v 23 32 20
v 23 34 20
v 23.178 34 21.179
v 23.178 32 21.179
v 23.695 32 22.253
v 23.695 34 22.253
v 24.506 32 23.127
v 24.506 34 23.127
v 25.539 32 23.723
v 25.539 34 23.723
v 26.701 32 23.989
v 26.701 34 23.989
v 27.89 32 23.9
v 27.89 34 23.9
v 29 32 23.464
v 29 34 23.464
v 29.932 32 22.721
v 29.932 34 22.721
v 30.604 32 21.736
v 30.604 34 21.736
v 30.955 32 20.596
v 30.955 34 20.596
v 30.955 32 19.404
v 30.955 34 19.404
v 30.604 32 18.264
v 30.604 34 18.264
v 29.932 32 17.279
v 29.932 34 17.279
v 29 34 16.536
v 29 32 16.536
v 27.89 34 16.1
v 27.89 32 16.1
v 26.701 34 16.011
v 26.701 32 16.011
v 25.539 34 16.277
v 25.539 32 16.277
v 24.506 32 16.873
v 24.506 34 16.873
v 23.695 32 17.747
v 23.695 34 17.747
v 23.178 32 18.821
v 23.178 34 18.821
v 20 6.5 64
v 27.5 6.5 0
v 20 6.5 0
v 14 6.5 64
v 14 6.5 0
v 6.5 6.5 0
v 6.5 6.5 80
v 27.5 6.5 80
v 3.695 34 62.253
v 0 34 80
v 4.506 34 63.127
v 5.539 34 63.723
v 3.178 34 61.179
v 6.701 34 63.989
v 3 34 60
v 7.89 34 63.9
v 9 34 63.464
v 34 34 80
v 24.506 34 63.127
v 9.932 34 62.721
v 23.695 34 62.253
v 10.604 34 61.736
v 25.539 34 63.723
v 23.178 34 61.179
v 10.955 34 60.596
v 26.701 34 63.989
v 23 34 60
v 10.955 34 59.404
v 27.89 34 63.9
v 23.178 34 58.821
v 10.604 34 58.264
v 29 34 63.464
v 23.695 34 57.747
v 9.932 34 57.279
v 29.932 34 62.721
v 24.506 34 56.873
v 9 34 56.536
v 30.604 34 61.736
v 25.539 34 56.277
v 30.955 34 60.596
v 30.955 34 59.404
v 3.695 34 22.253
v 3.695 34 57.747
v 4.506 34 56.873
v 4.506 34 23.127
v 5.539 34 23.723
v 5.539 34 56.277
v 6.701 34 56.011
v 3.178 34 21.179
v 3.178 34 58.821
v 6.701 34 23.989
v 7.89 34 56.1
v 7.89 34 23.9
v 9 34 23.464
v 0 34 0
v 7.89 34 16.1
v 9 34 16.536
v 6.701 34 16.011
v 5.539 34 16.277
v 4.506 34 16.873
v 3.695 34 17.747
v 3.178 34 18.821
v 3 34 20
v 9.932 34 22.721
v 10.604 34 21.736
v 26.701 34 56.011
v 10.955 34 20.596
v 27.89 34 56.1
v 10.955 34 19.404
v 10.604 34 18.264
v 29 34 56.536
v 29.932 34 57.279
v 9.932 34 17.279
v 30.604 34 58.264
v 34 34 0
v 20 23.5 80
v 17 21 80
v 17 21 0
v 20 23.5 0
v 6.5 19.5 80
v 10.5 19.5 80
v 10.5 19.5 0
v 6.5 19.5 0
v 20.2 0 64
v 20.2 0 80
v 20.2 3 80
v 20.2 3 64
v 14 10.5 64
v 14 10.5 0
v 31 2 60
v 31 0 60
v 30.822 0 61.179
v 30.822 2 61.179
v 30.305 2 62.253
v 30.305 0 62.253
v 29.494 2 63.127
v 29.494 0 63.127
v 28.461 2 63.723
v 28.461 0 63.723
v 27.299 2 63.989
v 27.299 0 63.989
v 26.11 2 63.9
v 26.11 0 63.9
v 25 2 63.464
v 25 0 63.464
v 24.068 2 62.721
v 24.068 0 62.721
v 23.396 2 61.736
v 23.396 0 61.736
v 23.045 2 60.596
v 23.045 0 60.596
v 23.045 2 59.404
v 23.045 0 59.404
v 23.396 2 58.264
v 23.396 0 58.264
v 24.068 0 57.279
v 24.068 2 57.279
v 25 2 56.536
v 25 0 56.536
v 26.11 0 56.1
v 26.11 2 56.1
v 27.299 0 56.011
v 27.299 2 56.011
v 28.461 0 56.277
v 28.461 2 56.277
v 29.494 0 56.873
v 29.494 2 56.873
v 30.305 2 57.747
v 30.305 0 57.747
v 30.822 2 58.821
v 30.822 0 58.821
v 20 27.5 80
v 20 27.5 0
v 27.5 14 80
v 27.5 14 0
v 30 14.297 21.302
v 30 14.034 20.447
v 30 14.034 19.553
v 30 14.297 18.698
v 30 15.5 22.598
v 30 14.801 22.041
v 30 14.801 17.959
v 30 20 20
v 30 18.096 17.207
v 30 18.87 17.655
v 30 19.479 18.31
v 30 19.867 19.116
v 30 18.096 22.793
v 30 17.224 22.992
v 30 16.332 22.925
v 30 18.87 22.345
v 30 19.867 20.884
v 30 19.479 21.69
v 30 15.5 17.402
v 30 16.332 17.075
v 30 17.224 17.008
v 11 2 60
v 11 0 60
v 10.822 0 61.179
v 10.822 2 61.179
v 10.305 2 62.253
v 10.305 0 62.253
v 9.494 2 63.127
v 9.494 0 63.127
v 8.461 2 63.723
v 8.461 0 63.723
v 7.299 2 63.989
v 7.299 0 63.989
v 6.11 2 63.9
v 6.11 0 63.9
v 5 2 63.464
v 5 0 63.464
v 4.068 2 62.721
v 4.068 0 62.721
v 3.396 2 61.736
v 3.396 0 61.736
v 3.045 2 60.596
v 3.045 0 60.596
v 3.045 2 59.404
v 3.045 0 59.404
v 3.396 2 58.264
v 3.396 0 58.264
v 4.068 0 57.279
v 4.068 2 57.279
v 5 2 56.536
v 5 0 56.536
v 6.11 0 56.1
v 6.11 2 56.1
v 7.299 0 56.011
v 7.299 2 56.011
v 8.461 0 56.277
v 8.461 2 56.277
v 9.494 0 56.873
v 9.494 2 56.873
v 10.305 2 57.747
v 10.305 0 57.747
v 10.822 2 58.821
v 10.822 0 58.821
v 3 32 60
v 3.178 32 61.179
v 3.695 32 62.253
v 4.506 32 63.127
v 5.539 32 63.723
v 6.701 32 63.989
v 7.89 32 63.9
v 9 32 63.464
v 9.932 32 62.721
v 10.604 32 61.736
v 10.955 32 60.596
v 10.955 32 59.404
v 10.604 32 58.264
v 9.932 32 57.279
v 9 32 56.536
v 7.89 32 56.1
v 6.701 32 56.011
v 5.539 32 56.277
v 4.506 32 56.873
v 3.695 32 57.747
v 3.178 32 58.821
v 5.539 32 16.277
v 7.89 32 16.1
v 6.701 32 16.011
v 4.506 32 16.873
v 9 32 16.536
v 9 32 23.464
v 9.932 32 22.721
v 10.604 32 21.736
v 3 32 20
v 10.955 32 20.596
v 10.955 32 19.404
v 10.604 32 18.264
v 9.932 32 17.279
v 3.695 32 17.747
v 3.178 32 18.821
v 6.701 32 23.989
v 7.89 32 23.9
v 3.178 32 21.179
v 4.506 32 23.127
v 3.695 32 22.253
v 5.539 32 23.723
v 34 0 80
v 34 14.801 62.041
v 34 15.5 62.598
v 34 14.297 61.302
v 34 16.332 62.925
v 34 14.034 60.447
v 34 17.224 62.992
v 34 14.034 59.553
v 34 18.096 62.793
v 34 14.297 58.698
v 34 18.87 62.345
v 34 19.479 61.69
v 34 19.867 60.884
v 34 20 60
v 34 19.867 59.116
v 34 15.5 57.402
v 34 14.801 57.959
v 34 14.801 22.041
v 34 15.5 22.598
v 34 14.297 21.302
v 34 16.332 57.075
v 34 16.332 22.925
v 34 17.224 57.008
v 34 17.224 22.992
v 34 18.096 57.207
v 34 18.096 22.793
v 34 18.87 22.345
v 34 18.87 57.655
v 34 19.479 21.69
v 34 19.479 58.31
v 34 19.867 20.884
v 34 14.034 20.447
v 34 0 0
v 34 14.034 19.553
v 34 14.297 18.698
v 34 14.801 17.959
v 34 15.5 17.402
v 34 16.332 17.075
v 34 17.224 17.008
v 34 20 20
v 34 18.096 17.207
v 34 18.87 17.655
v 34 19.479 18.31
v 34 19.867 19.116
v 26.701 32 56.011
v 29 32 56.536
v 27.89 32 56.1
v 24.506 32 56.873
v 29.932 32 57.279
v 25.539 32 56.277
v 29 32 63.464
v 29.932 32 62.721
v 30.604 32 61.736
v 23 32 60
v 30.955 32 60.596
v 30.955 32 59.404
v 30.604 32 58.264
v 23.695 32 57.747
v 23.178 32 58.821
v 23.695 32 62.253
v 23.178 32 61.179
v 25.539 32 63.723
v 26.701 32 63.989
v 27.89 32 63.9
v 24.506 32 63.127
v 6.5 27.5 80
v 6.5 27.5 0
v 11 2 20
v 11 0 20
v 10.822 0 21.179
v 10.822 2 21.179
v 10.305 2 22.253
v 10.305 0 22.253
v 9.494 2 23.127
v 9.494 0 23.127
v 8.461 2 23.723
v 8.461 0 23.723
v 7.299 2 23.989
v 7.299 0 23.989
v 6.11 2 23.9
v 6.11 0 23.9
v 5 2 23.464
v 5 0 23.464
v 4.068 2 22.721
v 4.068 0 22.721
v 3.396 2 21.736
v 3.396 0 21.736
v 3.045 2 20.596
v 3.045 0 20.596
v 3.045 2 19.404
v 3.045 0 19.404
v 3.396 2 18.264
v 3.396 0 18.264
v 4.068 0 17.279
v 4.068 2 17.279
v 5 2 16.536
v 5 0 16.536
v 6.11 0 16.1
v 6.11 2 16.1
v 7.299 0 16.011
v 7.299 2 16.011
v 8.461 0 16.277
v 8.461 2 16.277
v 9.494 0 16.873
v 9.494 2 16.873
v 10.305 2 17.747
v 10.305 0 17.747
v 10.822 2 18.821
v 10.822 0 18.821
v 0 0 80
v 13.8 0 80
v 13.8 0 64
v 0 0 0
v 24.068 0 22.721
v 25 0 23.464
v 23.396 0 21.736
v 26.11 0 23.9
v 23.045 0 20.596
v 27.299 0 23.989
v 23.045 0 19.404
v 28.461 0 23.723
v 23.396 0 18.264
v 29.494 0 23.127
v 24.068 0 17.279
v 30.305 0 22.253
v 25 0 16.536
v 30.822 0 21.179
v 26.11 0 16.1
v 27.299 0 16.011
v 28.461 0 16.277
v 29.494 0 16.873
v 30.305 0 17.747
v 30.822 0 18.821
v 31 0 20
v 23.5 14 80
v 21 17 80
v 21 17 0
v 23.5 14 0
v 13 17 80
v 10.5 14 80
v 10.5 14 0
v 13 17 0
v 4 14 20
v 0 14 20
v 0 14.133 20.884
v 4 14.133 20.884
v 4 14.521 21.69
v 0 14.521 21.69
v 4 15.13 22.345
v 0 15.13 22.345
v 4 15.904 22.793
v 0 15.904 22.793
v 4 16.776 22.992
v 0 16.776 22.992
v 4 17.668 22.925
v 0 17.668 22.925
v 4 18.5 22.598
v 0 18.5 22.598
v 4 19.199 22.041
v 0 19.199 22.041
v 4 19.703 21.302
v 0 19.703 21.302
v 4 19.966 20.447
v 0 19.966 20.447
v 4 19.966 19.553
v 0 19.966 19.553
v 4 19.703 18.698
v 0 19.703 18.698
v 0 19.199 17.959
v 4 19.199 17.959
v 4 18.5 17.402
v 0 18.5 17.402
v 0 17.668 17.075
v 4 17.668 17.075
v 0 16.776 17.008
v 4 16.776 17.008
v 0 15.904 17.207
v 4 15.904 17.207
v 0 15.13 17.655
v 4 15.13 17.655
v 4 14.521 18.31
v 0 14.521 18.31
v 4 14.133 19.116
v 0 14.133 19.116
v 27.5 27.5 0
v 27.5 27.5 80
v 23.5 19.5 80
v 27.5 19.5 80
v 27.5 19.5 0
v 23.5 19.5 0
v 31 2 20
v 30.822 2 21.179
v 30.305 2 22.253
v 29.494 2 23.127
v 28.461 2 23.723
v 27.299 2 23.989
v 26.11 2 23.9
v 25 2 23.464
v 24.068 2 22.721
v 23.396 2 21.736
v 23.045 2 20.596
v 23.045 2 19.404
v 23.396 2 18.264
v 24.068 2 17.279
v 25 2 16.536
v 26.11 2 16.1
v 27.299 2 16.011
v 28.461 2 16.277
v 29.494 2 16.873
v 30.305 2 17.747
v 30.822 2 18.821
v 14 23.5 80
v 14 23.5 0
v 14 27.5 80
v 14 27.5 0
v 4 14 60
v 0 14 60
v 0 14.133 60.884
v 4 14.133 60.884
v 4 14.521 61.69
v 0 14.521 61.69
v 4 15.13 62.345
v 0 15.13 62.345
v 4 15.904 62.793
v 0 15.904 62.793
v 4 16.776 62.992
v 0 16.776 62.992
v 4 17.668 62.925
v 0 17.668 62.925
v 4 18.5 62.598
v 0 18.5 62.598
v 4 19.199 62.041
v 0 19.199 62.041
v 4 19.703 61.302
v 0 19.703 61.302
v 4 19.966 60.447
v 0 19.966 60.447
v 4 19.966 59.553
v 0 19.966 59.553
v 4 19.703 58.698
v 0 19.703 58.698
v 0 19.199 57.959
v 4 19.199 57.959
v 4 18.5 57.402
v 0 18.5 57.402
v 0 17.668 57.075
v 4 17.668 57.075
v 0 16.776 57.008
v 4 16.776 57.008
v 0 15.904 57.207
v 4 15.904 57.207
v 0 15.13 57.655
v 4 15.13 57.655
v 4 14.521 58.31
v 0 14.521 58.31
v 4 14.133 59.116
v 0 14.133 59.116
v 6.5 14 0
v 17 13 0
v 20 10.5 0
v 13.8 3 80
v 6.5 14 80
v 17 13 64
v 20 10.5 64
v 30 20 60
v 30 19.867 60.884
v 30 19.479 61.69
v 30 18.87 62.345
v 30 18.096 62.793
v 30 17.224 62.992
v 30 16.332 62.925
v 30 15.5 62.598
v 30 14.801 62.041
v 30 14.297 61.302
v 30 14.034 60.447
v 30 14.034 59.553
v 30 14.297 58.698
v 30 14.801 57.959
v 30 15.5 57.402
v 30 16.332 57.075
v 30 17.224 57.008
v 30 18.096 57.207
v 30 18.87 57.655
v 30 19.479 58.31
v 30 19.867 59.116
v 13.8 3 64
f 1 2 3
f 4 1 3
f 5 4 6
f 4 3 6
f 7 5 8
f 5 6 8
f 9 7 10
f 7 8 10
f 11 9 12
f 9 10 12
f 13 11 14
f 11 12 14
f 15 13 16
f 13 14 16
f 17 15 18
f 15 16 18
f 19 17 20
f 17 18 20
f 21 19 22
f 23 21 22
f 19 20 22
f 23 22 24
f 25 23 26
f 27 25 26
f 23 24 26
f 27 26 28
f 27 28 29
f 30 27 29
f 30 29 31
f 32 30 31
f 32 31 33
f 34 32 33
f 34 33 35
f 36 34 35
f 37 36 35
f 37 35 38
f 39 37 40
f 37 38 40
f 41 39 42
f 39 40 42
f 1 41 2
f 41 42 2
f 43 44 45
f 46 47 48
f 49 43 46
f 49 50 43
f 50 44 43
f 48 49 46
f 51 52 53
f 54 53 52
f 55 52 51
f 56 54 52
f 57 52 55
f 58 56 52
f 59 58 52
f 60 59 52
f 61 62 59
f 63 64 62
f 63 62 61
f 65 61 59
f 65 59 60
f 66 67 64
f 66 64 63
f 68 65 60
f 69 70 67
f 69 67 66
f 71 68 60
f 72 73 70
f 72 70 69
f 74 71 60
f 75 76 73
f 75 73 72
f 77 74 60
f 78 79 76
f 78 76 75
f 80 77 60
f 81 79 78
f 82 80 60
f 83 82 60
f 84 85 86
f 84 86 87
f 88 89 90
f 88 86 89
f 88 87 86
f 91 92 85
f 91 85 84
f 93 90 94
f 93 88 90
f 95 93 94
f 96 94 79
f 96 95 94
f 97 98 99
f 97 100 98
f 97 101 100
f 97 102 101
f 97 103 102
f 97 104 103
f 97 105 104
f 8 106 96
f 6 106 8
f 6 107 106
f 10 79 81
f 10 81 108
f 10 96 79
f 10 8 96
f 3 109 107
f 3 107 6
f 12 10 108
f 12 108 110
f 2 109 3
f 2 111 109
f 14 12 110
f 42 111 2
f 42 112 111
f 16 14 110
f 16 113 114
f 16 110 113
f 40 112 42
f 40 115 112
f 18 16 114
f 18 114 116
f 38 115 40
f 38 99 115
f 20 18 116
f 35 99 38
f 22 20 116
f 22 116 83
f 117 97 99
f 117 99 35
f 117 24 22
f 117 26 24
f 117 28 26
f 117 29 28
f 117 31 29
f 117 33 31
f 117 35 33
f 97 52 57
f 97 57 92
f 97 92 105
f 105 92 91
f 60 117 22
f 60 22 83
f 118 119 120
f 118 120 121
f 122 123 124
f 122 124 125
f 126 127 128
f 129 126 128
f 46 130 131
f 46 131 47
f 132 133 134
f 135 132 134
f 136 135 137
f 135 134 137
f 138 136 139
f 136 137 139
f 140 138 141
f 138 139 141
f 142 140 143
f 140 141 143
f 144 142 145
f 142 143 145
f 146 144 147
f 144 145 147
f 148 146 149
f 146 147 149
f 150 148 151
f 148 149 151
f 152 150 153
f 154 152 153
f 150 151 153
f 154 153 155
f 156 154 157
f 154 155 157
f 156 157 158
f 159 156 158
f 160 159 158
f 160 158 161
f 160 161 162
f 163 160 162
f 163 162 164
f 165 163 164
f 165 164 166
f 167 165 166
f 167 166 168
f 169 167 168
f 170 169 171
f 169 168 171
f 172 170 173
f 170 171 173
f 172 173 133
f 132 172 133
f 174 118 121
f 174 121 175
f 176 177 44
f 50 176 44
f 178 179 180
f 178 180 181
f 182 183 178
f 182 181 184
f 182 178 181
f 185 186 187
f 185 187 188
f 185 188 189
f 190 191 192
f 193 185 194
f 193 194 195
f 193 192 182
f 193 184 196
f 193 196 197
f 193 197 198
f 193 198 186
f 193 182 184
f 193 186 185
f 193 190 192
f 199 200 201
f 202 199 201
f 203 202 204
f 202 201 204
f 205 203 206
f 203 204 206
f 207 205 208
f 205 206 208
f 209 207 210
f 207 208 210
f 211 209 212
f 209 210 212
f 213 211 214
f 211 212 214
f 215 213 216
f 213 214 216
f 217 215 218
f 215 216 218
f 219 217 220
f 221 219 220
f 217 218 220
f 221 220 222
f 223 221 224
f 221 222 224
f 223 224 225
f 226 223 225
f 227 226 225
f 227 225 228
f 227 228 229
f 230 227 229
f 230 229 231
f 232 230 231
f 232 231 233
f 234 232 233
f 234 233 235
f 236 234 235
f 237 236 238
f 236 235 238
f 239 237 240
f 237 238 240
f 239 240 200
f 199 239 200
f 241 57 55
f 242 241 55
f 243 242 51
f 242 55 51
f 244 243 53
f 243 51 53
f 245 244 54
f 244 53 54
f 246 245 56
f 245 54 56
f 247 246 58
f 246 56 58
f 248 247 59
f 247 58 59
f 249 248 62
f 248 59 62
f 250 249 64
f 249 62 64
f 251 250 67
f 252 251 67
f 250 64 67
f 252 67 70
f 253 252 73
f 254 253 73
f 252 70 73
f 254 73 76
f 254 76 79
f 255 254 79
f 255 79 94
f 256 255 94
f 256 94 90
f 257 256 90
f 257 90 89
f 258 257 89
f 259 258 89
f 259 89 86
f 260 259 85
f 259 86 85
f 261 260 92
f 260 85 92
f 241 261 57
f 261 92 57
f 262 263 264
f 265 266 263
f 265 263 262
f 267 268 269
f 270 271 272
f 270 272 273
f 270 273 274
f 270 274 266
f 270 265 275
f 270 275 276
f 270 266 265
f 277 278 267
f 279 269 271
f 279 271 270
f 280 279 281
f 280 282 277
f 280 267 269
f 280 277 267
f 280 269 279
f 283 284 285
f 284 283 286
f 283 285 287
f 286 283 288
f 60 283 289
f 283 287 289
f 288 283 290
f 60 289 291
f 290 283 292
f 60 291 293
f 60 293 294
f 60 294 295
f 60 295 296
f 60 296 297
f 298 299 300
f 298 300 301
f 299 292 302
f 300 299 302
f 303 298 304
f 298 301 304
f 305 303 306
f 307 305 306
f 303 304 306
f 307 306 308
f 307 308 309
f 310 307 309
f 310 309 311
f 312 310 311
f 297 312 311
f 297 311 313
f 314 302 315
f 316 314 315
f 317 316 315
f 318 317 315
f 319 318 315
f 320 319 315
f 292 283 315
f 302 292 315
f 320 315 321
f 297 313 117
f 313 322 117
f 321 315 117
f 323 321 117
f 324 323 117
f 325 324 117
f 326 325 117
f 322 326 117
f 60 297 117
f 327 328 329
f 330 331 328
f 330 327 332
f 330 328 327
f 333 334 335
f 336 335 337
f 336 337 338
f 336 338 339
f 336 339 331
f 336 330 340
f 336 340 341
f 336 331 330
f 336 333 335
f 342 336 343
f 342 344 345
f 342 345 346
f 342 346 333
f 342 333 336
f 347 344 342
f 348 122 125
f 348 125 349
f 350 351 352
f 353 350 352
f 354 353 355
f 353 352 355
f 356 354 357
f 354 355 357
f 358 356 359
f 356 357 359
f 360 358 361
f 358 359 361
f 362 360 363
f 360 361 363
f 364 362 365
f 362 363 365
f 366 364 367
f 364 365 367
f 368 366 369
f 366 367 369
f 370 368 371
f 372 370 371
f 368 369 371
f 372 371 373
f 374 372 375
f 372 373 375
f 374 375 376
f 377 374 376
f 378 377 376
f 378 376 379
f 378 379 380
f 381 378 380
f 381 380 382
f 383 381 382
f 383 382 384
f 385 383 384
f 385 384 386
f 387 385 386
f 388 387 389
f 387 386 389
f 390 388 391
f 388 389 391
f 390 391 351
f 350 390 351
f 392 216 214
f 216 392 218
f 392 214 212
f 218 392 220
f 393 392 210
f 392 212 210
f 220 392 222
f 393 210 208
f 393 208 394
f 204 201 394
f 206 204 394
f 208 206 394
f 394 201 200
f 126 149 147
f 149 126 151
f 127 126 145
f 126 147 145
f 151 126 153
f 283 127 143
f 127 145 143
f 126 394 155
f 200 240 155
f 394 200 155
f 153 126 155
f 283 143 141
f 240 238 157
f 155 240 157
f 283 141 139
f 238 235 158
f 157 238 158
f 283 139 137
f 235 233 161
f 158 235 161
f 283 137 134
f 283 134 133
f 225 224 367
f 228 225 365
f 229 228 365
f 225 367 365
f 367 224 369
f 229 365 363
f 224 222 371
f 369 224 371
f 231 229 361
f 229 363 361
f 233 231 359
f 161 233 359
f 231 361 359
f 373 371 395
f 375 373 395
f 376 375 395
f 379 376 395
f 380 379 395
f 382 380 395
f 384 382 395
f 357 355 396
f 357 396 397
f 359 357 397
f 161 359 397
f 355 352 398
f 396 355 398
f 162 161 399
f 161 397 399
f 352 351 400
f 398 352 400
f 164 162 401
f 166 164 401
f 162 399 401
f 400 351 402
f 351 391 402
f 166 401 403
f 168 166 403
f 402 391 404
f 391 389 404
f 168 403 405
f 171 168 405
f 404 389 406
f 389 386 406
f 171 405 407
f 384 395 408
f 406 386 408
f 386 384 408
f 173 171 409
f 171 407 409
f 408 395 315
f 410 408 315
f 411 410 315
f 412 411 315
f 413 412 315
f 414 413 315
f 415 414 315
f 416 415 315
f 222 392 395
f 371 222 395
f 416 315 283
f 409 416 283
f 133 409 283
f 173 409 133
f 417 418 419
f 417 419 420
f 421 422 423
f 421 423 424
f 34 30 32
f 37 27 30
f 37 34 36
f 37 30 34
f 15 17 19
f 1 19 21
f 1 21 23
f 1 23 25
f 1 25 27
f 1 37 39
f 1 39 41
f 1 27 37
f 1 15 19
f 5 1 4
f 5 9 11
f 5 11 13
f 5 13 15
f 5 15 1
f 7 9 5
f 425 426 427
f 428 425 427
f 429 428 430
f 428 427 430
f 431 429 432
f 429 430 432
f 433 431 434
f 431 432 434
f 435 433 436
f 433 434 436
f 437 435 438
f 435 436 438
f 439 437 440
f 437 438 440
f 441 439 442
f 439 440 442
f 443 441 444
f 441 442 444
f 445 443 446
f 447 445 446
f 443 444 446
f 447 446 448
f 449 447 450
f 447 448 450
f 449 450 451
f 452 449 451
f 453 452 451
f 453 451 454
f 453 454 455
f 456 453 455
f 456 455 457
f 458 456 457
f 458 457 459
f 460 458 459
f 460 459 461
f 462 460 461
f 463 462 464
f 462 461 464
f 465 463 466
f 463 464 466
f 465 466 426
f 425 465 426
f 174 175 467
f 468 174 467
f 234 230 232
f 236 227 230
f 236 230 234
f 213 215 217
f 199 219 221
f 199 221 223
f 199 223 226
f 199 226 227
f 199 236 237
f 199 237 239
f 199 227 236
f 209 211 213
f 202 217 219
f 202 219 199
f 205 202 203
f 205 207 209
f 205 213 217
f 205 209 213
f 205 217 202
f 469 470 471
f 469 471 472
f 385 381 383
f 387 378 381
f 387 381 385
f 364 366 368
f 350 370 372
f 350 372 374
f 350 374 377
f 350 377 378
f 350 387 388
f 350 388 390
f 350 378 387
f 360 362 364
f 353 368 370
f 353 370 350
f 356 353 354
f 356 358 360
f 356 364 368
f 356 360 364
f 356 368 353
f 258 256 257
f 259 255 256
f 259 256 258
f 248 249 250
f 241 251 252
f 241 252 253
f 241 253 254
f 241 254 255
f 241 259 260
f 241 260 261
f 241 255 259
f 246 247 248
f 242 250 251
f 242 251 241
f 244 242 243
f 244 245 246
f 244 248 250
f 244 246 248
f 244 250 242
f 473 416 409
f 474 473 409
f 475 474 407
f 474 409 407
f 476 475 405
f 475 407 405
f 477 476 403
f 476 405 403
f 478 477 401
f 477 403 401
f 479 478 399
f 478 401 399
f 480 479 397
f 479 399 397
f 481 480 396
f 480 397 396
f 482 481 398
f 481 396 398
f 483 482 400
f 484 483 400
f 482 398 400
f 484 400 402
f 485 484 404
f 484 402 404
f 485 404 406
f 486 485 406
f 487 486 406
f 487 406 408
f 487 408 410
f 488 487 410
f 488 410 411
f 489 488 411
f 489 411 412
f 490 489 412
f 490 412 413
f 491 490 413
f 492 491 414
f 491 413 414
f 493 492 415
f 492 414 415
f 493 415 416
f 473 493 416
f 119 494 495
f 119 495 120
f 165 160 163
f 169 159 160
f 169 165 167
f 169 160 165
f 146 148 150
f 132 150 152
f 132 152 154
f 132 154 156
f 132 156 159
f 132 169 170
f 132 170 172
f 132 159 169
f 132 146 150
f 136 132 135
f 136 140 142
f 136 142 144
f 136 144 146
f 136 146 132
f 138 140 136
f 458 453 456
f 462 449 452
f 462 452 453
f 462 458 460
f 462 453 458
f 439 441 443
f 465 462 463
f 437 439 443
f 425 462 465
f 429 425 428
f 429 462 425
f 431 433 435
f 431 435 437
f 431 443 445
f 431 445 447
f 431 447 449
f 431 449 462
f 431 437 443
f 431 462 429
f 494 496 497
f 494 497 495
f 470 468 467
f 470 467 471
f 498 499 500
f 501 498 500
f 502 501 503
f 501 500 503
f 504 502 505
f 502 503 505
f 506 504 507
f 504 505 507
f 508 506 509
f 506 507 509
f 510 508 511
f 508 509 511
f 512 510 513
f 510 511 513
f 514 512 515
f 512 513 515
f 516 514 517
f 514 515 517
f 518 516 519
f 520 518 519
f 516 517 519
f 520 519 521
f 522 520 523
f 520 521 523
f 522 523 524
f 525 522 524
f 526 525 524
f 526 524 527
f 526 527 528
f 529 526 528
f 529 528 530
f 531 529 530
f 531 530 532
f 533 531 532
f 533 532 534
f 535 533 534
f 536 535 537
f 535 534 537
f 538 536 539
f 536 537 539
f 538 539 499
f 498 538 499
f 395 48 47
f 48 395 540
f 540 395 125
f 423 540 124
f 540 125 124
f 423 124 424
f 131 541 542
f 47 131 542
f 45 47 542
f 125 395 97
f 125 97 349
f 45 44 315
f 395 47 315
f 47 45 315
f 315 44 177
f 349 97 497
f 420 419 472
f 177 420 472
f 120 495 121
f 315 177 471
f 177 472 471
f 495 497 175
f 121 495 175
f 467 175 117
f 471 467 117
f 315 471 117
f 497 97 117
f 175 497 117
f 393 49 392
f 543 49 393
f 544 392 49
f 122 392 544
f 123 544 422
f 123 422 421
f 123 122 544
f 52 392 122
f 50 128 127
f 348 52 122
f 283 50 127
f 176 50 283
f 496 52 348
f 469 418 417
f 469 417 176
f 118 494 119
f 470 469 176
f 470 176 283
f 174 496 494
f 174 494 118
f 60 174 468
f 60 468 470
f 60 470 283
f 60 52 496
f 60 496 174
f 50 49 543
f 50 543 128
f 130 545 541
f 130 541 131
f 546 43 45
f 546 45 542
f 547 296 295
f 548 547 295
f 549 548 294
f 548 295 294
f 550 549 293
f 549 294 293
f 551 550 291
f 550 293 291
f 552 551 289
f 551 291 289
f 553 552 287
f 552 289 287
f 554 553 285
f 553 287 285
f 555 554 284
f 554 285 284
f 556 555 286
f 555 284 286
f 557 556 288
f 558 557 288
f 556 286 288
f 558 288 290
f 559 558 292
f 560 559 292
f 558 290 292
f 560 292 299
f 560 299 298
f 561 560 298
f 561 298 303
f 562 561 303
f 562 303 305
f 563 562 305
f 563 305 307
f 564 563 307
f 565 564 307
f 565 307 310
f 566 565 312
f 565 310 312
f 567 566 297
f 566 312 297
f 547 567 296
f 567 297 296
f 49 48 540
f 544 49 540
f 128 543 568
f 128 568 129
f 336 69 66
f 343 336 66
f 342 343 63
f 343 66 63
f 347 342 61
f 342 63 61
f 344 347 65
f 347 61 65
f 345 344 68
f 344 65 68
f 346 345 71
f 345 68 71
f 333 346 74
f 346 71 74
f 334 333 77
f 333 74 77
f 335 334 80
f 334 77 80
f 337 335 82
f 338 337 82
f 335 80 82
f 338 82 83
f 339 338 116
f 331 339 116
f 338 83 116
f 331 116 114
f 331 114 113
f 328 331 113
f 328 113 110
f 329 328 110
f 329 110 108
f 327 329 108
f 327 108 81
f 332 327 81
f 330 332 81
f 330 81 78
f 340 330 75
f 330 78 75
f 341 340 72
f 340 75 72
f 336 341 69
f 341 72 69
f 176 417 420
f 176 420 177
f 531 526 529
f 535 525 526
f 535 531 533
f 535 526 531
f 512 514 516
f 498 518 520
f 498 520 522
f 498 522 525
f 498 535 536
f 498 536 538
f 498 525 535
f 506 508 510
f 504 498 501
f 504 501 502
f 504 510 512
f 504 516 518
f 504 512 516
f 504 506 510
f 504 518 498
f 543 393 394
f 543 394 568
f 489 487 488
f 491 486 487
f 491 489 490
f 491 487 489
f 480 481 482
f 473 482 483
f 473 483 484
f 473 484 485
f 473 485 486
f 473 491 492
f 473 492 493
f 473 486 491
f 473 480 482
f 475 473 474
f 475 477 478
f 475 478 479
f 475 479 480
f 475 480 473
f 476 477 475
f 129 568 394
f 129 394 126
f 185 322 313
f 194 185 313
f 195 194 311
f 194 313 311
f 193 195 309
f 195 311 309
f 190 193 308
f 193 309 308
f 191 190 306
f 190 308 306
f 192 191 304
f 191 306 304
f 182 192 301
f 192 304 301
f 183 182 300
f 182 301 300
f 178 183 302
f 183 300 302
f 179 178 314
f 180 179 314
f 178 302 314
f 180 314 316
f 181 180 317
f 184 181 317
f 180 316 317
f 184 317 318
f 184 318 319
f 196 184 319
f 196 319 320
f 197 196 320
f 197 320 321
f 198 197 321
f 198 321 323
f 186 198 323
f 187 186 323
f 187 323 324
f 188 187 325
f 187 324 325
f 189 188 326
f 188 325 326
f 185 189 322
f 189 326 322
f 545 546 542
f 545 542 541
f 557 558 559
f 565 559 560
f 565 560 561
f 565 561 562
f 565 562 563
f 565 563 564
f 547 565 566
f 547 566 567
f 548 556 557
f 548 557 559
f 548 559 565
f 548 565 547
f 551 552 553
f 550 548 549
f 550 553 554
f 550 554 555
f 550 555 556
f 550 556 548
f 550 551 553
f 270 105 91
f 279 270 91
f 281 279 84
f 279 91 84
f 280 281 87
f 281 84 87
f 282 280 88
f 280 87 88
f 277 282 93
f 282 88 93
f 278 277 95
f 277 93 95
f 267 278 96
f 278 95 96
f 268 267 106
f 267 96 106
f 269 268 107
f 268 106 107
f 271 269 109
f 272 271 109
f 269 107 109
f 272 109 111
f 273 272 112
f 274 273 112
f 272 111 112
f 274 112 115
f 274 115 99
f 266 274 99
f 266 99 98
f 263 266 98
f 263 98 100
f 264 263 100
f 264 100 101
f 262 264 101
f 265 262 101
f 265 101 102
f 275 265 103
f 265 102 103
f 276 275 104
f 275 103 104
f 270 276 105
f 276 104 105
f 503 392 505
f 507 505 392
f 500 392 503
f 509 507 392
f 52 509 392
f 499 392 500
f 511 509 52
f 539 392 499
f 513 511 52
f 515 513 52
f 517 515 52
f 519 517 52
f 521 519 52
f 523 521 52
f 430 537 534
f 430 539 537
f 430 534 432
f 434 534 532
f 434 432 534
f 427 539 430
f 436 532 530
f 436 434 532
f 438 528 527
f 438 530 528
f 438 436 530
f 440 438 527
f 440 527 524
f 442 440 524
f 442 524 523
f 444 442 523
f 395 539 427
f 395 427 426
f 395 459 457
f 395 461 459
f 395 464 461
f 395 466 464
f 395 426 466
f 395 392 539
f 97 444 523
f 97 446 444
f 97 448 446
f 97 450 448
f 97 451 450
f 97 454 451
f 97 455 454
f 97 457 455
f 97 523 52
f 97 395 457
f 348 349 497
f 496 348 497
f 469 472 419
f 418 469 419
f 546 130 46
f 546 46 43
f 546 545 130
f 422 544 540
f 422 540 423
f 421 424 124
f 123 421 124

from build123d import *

# Parameters (mm, degrees)
SKETCH_W        = 34
SKETCH_H        = 34
PAD_DEPTH       = 80
POCKET_DEPTH    = 80
SKETCH002_R     = 3
POCKET001_DEPTH = 4
SKETCH003_R     = 3
POCKET002_DEPTH = 4
SKETCH004_R     = 4
POCKET003_DEPTH = 2
SKETCH005_R     = 4
POCKET004_DEPTH = 2
SKETCH006_W     = 6.4
SKETCH006_H     = 3
SKETCH006_W_2   = 8
SKETCH006_H_2   = 8
POCKET005_DEPTH = 16


with BuildPart() as part:
    # Sketch → Pad (new body)
    with BuildSketch(Plane.XY):
        with Locations((17, 17)):
            Rectangle(SKETCH_W, SKETCH_H)
    extrude(amount=PAD_DEPTH)

    # Sketch001 (on Face6 of Pad) → Pocket (cut)
    with BuildSketch(Plane.XY.offset(80)):
        Polygon((6.5, 27.5), (14, 27.5), (14, 23.5), (17, 21), (20, 23.5), (20, 27.5), (27.5, 27.5), (27.5, 19.5), (23.5, 19.5), (21, 17), (23.5, 14), (27.5, 14), (27.5, 6.5), (20, 6.5), (20, 10.5), (17, 13), (14, 10.5), (14, 6.5), (6.5, 6.5), (6.5, 14), (10.5, 14), (13, 17), (10.5, 19.5), (6.5, 19.5), align=None)
    extrude(amount=-POCKET_DEPTH, mode=Mode.SUBTRACT)

    # Sketch002 (on Face2 of Pocket) → Pocket001 (cut)
    with BuildSketch(Plane(origin=(0, 0, 0), x_dir=(0, -1, 0), z_dir=(-1, 0, 0))):
        with Locations((-17, 60)):
            Circle(SKETCH002_R)
        with Locations((-17, 20)):
            Circle(SKETCH002_R)
    extrude(amount=-POCKET001_DEPTH, mode=Mode.SUBTRACT)

    # Sketch003 (on Face3 of Pocket001) → Pocket002 (cut)
    with BuildSketch(Plane.YZ.offset(34)):
        with Locations((17, 60)):
            Circle(SKETCH003_R)
        with Locations((17, 20)):
            Circle(SKETCH003_R)
    extrude(amount=-POCKET002_DEPTH, mode=Mode.SUBTRACT)

    # Sketch004 (on Face1 of Pocket002) → Pocket003 (cut)
    with BuildSketch(Plane(origin=(0, 34, 0), x_dir=(-1, 0, 0), z_dir=(0, 1, 0))):
        with Locations((-27, 60)):
            Circle(SKETCH004_R)
        with Locations((-7, 60)):
            Circle(SKETCH004_R)
        with Locations((-27, 20)):
            Circle(SKETCH004_R)
        with Locations((-7, 20)):
            Circle(SKETCH004_R)
    extrude(amount=-POCKET003_DEPTH, mode=Mode.SUBTRACT)

    # Sketch005 (on Face10 of Pocket003) → Pocket004 (cut)
    with BuildSketch(Plane.XZ):
        with Locations((7, 60)):
            Circle(SKETCH005_R)
        with Locations((27, 60)):
            Circle(SKETCH005_R)
        with Locations((7, 20)):
            Circle(SKETCH005_R)
        with Locations((27, 20)):
            Circle(SKETCH005_R)
    extrude(amount=-POCKET004_DEPTH, mode=Mode.SUBTRACT)

    # Sketch006 (on Face4 of Pocket004) → Pocket005 (cut)
    with BuildSketch(Plane.XY.offset(80)):
        with Locations((17, 1.5)):
            Rectangle(SKETCH006_W, SKETCH006_H)
        with Locations((17, 10.5)):
            Rectangle(SKETCH006_W_2, SKETCH006_H_2)
    extrude(amount=-POCKET005_DEPTH, mode=Mode.SUBTRACT)


solid = part.part
